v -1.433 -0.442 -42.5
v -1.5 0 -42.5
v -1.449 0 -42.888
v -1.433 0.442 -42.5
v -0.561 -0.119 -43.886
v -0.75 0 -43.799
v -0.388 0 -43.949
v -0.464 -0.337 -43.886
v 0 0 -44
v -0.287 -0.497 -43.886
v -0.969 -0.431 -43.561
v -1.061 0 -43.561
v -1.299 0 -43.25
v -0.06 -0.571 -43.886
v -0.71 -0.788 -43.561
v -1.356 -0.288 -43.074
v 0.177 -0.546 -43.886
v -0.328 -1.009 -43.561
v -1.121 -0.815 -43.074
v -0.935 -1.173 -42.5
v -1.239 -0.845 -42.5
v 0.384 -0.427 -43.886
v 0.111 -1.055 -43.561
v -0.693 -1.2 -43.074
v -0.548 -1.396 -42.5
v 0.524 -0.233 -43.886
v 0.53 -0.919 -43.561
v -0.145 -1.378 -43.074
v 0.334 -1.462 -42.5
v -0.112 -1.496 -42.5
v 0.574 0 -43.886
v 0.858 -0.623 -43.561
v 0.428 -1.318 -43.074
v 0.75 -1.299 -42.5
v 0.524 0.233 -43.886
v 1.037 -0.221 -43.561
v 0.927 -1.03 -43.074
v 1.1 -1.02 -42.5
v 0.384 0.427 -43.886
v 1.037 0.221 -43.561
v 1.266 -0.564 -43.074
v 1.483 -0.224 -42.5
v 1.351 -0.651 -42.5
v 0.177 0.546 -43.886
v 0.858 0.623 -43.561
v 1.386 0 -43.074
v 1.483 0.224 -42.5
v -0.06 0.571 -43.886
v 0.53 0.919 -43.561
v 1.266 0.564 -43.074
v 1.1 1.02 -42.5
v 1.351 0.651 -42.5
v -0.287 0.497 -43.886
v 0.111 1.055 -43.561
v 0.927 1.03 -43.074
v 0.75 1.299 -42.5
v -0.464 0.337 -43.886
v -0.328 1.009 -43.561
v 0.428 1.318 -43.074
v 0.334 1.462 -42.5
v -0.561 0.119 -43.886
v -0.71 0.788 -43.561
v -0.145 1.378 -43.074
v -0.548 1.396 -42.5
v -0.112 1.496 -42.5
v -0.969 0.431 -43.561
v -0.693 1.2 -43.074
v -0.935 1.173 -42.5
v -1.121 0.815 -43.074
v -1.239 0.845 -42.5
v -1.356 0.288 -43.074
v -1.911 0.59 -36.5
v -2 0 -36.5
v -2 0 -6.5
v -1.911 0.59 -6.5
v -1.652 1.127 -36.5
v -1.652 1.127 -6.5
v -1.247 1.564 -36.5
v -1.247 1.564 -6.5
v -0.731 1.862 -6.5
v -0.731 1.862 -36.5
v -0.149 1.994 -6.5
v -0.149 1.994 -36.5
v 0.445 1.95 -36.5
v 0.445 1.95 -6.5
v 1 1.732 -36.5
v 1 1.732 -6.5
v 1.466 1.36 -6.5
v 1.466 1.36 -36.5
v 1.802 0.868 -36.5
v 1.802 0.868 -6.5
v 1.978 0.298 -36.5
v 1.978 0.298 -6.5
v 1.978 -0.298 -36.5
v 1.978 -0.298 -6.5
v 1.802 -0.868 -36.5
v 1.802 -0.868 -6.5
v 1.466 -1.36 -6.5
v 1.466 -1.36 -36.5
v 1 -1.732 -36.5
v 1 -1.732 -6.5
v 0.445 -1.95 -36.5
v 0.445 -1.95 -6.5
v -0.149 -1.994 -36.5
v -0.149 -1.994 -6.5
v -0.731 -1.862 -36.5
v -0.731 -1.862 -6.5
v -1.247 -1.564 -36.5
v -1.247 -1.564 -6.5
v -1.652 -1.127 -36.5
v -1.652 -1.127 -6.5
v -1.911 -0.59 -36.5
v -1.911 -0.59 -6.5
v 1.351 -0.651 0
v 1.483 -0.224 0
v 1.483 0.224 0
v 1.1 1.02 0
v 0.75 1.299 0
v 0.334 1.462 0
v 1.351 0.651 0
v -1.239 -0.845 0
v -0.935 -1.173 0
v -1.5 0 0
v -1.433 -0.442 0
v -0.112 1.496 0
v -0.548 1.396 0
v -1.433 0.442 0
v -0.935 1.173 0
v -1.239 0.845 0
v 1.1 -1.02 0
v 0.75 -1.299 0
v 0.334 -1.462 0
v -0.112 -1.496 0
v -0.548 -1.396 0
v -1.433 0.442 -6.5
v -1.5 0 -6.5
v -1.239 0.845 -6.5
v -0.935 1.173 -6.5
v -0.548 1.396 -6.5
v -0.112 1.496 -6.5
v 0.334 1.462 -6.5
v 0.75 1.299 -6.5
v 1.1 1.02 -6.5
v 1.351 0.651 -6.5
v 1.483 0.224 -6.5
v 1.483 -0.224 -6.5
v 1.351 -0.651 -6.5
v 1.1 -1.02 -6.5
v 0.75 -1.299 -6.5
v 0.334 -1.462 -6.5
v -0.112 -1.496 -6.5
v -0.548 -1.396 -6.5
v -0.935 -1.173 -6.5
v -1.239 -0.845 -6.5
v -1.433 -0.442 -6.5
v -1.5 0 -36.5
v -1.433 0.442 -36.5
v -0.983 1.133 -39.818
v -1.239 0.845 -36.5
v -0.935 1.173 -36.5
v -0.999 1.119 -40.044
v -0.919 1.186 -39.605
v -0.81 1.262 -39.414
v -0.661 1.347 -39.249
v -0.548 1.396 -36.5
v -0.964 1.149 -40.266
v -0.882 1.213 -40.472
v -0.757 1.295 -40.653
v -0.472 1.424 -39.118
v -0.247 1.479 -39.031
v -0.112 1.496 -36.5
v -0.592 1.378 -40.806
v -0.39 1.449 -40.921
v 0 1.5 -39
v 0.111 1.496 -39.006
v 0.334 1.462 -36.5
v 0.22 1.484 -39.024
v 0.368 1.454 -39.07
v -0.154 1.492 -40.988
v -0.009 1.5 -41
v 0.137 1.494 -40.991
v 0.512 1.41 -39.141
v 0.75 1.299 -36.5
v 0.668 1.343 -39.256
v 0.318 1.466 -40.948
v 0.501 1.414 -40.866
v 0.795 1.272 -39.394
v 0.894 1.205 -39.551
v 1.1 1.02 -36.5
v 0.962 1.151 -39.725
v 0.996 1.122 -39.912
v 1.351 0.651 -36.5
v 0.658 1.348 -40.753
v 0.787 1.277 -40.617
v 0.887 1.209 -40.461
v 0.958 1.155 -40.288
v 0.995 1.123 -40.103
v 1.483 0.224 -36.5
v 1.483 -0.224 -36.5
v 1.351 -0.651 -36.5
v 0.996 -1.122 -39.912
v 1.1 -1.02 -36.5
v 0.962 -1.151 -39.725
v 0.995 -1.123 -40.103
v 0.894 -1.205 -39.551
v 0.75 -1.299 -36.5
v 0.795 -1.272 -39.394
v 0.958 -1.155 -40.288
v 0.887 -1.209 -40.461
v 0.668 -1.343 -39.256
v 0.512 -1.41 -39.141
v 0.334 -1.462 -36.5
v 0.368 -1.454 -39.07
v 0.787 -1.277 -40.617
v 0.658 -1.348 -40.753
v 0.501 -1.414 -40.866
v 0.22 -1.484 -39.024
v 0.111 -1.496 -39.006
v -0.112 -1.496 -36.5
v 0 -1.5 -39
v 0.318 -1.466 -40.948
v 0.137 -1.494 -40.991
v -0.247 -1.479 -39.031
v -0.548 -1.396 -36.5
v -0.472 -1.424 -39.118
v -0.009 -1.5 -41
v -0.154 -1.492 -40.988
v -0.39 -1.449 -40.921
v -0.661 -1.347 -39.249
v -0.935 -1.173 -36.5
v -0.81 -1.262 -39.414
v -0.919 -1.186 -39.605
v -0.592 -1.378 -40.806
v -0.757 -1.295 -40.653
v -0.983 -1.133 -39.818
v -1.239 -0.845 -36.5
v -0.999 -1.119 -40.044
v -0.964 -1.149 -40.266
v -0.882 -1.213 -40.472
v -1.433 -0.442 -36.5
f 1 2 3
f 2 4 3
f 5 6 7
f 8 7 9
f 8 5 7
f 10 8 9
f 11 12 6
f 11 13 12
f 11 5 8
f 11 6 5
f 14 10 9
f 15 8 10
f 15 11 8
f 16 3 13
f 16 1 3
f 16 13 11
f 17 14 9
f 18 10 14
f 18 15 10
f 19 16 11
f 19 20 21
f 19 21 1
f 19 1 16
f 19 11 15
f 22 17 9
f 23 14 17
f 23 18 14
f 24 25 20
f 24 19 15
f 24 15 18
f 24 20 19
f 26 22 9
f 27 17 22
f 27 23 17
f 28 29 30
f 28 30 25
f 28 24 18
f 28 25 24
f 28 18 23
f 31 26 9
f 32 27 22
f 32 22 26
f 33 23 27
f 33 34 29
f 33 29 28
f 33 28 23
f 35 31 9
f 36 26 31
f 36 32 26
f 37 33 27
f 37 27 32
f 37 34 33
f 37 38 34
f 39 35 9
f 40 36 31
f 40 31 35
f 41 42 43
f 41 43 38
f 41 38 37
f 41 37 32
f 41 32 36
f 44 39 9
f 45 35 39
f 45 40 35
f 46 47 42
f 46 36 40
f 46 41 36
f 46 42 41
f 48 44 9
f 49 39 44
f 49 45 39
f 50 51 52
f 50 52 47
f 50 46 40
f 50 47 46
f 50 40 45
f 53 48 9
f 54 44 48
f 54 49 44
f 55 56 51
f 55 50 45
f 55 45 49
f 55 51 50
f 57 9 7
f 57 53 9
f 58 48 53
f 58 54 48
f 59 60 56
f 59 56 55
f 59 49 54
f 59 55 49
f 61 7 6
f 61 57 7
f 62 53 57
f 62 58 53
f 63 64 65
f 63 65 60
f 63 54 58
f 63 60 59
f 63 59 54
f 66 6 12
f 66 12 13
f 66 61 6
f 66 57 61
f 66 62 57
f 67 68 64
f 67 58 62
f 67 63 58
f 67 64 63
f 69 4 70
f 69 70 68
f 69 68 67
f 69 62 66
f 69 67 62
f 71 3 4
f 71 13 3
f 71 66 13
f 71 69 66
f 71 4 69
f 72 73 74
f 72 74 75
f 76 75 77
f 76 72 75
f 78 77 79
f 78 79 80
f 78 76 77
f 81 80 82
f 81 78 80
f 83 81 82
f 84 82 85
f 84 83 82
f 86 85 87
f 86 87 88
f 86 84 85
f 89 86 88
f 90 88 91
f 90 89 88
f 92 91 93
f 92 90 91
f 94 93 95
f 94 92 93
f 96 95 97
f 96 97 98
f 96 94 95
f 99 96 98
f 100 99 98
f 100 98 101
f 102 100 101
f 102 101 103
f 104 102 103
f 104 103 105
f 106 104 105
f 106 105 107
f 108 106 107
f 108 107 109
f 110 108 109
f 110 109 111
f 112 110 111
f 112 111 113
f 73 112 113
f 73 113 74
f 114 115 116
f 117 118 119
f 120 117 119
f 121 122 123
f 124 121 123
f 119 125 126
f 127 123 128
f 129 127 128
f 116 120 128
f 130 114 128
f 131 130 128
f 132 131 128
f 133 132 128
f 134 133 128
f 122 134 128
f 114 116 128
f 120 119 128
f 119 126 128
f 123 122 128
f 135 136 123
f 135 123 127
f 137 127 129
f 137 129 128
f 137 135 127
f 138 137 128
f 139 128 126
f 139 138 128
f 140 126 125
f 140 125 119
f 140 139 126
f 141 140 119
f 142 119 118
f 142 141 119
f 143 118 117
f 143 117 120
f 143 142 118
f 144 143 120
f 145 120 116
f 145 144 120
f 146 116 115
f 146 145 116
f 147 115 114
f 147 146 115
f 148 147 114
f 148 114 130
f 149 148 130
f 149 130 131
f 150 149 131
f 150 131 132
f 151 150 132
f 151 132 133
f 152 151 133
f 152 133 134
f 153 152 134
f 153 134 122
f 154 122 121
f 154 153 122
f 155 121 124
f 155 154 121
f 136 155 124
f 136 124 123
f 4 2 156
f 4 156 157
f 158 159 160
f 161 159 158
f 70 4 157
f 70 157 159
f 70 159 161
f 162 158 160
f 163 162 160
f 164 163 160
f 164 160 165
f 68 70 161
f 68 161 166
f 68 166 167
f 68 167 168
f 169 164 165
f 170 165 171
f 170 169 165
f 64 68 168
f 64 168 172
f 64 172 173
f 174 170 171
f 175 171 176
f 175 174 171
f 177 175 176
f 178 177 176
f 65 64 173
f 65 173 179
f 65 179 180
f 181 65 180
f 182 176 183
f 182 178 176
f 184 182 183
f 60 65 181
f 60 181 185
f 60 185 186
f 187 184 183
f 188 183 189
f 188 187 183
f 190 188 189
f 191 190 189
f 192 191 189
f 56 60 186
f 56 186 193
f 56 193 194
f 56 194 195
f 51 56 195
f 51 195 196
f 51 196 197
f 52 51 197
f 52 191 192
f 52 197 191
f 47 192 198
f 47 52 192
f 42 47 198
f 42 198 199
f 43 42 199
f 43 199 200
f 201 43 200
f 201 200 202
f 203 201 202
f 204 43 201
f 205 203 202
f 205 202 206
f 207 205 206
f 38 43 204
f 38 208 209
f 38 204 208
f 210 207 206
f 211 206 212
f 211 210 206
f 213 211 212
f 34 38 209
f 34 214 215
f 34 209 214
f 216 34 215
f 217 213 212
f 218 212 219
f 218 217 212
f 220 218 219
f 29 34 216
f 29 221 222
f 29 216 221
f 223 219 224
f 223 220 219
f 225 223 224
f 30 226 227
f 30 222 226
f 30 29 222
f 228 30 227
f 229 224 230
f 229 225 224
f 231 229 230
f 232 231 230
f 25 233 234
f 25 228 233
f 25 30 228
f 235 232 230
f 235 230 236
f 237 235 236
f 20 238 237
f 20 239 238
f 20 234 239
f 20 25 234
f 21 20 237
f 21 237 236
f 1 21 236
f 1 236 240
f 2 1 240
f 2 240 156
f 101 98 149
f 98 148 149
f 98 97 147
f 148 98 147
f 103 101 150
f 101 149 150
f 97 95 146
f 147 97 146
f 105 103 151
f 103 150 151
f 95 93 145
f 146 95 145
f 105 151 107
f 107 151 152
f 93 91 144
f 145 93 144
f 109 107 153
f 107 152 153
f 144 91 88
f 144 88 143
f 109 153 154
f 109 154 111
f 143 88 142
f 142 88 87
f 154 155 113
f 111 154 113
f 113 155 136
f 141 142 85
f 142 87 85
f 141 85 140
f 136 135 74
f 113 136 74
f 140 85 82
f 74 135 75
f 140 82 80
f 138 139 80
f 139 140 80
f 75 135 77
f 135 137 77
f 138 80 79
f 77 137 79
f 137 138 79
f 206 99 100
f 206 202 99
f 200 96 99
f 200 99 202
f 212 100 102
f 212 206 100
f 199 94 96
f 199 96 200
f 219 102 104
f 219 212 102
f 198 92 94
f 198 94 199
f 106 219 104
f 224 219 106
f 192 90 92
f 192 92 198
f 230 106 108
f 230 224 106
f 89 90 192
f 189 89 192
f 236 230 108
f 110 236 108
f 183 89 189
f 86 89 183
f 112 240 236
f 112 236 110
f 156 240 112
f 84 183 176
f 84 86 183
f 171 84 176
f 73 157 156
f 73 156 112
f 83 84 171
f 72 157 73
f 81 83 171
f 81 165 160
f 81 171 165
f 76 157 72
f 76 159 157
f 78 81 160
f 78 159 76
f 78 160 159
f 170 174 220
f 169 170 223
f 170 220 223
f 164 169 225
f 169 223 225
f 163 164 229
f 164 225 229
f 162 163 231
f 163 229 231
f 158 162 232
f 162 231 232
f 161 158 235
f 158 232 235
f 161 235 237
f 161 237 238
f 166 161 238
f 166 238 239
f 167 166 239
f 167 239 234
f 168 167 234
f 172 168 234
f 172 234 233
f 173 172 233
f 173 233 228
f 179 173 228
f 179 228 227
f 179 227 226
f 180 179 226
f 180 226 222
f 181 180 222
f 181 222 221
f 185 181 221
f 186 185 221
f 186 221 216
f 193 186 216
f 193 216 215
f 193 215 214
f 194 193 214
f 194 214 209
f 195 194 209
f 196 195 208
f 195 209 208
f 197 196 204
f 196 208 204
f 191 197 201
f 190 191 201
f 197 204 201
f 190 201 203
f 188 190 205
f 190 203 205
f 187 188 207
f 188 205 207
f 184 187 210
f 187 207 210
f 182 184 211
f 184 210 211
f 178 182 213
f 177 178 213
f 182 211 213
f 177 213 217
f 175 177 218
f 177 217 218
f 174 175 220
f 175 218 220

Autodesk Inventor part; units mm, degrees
ref_plane "YZ Plane" through (0, 0, 0) normal (1, 0, 0) x (0, 1, 0)
ref_plane "XY Plane" through (0, 0, 0) normal (0, 0, 1) x (1, 0, 0)
sketch "Skizze1" plane through (0, 0, 0) normal (0, 1, 0) x (-1, 0, 0)
  line L0 (0, 0) -> (1.5, 0)
  line L1 (1.5, 0) -> (1.5, -6.5)
  line L2 (1.5, -6.5) -> (2, -6.5)
  line L3 (2, -6.5) -> (2, -36.5)
  line L4 (0, 0) -> (0, -44)
  line L5 (2, -36.5) -> (1.5, -36.5)
  line L6 (1.5, -36.5) -> (1.5, -42.5)
  arc A0 (0, -44) -> (1.5, -42.5) centre (0, -42.5) ccw
  point P0 (0, -26.7554)
  dimension "d0" = 6.5
  dimension "d1" = 3
  dimension "d2" = 4
  dimension "d5" = 30
  dimension "d6" = 0.5
  dimension "d7" = 6
revolve "Umdrehung1" add sketch "Skizze1" angle 360 about axis through (0, 0, 0) along (0, 0, -1)
thread "Gewinde1" size "M3x0.5" class "6g" standard "ISO Metric profile" length 18
ref_plane "Arbeitsebene1" through (0, 1.75, 0) normal (0, 1, 0) x (-1, 0, 0)
sketch "Skizze2" plane through (0, 1.75, 0) normal (0, 1, 0) x (-1, 0, 0)
  line L0 (-2, -36.5) -> (2, -36.5) projected
  point P0 (0, 0)
  point P1 (0, -40)
  dimension "d13" = 3.5
hole "Bohrung1" at (0, 1.75, -40) direction (0, -1, 0) diameter 2 end through all
properties part number "19_2"
